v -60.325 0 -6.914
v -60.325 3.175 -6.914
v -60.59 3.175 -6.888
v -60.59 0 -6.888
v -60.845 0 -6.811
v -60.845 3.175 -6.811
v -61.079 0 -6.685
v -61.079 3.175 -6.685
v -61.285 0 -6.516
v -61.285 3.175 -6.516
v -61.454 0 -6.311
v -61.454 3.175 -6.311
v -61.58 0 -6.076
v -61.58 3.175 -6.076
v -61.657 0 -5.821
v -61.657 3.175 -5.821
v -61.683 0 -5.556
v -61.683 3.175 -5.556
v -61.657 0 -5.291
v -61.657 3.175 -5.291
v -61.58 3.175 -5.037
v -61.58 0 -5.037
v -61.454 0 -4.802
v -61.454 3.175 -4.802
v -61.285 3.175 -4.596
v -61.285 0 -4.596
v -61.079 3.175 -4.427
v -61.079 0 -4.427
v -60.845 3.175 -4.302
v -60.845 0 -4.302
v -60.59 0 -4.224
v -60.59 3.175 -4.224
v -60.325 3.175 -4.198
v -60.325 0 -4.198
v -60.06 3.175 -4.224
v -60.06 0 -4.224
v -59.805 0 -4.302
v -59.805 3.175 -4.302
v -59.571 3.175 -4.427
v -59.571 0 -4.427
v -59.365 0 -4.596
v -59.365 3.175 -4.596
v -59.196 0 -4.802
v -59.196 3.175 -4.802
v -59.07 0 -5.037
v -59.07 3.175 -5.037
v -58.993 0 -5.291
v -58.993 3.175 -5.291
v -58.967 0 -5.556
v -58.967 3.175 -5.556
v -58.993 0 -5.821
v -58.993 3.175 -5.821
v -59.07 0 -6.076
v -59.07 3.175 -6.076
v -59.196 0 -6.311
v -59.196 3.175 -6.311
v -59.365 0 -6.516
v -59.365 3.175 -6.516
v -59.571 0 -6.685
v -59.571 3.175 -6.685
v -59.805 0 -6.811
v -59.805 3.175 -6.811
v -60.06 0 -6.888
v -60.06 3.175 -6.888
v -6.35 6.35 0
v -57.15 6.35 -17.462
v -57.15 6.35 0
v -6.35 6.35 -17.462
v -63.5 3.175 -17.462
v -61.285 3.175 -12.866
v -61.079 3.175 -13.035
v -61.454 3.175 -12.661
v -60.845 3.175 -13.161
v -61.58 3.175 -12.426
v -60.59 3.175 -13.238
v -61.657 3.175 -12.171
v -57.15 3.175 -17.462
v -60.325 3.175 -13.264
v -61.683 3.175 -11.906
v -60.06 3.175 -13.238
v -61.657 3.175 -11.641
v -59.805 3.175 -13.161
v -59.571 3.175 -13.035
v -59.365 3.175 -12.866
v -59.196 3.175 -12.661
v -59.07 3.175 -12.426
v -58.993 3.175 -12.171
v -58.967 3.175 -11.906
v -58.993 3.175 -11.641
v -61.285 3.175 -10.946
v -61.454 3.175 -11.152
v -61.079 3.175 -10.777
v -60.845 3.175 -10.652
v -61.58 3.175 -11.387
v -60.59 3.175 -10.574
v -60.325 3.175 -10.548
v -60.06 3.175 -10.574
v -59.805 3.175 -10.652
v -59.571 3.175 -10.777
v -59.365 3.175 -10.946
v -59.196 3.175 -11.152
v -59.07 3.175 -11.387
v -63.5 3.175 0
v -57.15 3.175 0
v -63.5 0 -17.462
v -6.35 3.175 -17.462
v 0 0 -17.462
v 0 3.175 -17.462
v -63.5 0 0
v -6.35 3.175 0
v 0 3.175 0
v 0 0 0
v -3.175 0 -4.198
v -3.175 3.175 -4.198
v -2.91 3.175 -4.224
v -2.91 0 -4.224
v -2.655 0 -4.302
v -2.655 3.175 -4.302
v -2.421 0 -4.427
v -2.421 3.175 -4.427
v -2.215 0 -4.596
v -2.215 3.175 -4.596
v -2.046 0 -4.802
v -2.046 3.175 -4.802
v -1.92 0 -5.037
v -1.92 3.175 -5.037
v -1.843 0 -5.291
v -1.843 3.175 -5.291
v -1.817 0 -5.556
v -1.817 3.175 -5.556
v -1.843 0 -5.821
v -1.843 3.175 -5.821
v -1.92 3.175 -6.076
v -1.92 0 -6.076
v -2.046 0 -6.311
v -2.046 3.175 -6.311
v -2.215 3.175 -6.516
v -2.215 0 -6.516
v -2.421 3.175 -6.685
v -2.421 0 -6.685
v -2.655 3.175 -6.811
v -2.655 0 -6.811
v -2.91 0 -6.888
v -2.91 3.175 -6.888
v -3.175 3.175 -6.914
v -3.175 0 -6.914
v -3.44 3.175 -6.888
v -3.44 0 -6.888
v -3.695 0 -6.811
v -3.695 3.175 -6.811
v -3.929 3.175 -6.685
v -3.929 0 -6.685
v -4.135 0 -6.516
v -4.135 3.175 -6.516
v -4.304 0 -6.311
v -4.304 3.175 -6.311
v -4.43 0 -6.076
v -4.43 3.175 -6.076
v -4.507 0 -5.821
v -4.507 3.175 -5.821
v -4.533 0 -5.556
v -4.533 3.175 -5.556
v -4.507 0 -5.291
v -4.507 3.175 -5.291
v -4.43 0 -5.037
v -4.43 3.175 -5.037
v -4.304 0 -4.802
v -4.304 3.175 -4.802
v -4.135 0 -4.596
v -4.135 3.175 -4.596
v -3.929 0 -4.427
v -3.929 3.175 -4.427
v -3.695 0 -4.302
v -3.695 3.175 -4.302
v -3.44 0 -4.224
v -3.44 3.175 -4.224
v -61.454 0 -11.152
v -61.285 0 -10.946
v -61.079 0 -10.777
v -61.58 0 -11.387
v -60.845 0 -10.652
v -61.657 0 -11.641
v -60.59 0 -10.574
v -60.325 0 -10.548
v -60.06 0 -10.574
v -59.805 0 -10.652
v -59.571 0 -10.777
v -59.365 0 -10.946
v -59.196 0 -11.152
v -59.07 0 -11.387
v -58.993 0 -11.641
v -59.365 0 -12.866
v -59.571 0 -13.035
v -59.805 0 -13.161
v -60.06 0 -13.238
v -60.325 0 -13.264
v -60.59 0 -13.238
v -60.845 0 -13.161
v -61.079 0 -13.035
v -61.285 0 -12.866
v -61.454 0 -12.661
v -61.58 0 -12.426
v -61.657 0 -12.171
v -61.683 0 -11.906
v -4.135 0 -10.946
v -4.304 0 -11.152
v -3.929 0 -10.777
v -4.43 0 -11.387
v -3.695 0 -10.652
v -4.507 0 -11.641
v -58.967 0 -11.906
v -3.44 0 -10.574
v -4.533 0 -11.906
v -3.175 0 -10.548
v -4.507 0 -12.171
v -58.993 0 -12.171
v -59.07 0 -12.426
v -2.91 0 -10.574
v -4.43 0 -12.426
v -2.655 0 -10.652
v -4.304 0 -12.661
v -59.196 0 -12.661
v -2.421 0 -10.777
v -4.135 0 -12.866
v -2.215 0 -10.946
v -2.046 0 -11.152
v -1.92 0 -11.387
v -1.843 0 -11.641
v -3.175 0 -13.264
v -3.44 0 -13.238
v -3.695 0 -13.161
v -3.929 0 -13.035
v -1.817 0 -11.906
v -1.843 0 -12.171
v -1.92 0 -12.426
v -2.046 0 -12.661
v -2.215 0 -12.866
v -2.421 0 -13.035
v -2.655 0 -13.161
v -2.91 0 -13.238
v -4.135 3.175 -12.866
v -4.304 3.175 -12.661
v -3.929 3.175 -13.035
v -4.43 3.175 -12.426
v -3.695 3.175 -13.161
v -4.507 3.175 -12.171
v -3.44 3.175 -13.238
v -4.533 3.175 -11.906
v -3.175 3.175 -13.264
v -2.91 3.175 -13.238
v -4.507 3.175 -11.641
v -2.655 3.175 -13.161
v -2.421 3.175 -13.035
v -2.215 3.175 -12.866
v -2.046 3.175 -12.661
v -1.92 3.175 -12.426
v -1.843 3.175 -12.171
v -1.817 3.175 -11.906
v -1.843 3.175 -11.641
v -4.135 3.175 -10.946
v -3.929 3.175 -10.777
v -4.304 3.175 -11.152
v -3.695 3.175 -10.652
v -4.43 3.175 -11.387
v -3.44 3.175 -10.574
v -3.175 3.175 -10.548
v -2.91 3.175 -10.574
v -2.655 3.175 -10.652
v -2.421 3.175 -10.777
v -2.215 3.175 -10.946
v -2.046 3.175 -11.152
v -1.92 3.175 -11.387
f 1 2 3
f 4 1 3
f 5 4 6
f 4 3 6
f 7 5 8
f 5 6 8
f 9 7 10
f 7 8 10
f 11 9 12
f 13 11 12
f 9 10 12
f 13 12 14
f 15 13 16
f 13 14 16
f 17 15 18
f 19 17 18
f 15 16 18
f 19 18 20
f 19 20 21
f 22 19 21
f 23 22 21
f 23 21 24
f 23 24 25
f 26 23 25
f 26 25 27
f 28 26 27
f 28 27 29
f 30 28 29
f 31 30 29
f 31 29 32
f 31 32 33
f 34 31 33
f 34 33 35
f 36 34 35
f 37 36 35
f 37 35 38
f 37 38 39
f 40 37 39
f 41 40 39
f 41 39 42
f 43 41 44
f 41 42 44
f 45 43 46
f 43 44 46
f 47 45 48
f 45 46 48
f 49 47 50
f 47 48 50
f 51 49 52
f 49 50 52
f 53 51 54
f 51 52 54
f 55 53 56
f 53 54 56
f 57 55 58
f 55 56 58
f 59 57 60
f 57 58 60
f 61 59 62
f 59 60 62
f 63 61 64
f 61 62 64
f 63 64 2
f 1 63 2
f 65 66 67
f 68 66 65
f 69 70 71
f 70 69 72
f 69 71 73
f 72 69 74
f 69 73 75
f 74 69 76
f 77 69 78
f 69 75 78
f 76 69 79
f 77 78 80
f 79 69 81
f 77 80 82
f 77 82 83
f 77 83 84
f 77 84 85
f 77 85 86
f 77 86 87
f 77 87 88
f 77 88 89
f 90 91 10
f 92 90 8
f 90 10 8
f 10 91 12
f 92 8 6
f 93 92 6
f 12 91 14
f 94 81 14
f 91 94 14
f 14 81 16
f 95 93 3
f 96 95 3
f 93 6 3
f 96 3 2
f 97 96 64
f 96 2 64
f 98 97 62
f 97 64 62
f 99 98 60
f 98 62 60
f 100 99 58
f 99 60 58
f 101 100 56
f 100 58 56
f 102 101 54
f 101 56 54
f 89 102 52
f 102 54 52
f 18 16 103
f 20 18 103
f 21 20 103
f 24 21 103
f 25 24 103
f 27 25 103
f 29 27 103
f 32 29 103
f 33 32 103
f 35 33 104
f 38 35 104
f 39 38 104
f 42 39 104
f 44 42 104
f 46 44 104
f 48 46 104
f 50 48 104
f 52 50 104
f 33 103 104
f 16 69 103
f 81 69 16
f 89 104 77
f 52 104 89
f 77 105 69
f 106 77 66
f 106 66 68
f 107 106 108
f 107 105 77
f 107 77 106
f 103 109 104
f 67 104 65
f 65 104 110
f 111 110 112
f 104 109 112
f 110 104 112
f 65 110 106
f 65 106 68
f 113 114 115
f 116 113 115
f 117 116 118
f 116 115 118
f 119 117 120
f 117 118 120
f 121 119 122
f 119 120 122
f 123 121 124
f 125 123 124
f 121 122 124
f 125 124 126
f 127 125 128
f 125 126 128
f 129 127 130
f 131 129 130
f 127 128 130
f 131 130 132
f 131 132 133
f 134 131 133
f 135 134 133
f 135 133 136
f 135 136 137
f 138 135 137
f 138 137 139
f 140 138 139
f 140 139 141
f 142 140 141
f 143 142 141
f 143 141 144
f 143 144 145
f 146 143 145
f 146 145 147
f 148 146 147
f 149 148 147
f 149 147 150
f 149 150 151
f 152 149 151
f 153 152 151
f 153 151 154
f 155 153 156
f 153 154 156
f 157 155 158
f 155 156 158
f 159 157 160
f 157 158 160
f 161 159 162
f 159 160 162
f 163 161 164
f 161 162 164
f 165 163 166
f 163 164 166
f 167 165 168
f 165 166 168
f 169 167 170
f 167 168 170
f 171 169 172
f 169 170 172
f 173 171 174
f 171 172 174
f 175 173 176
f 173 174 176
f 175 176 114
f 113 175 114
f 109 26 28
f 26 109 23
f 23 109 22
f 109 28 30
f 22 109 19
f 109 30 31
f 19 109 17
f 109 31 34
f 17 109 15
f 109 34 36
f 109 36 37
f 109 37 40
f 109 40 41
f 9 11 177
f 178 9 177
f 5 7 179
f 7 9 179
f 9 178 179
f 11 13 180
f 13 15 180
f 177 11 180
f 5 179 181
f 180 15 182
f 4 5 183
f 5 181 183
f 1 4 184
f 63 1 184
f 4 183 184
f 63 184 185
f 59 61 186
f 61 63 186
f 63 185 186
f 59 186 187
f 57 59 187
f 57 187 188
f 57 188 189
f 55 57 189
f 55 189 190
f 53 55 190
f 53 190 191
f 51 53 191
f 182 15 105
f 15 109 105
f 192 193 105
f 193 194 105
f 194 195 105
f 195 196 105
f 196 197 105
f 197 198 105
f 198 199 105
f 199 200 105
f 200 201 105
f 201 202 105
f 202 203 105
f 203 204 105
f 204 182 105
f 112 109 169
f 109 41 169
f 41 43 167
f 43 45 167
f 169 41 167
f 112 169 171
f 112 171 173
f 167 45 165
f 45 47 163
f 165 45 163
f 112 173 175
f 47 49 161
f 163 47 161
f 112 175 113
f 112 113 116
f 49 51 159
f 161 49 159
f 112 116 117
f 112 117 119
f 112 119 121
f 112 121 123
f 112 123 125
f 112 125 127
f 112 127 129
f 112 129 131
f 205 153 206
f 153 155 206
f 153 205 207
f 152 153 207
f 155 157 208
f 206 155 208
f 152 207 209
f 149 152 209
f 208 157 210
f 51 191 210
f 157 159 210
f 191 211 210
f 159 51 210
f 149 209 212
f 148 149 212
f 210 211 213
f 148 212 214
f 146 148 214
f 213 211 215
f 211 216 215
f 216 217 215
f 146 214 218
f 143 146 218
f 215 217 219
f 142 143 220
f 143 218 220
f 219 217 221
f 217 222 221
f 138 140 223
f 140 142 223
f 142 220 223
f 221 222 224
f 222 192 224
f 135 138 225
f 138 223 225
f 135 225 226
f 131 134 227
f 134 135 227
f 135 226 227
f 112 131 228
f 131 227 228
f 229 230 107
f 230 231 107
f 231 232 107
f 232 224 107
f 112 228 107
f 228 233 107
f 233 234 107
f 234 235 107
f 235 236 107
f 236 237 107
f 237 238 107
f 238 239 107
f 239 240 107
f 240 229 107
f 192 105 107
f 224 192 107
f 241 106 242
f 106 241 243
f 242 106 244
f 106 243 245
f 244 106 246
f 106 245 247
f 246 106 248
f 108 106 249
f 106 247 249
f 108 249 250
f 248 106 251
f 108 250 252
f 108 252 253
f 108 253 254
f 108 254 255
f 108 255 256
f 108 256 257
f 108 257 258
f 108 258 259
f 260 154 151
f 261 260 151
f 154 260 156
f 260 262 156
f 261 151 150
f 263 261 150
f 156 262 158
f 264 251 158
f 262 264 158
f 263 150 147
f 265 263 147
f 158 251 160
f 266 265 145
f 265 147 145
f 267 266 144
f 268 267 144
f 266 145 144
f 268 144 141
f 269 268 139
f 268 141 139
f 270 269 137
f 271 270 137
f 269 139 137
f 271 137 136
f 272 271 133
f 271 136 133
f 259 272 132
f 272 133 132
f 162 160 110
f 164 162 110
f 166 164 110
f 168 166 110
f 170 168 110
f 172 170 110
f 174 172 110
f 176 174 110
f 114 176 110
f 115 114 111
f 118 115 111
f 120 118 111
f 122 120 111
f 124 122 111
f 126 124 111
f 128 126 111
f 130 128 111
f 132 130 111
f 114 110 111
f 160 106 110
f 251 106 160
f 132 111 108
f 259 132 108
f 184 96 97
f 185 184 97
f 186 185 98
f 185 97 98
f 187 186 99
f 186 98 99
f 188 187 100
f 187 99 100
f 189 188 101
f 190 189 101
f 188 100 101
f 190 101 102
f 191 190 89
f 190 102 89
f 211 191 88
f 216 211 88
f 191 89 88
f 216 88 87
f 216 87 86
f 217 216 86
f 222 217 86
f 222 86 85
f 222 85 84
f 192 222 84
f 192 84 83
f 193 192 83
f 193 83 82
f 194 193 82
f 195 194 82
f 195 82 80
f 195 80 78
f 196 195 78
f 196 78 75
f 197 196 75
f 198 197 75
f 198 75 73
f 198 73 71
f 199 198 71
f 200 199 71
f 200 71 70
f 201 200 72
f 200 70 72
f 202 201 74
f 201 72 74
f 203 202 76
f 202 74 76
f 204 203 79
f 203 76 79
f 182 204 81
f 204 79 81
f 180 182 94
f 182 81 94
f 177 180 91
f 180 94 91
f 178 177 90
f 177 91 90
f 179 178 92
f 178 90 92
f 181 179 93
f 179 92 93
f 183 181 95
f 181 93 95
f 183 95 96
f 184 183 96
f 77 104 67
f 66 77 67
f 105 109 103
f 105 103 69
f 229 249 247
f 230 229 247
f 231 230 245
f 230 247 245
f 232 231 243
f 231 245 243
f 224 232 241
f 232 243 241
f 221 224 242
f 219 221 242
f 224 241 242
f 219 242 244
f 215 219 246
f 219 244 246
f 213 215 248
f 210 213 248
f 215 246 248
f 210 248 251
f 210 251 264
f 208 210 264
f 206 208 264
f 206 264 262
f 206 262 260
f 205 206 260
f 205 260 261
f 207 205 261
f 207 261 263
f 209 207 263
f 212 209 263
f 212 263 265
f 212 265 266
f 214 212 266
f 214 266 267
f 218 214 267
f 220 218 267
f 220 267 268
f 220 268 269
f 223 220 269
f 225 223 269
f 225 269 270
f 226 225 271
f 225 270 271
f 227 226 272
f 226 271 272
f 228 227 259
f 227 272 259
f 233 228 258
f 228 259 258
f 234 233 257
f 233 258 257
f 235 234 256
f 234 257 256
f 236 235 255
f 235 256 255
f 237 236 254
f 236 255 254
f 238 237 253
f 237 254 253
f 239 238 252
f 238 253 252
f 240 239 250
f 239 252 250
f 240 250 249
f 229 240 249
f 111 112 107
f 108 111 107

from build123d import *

# Parameters (mm, degrees)
SKETCH1_W           = 63.5
SKETCH1_H           = 17.4625
BOSS_EXTRUDE1_DEPTH = 6.35
SKETCH2_W           = 6.35
SKETCH2_H           = 3.175
CUT_EXTRUDE1_DEPTH  = 67.1627645
SKETCH3_R           = 1.357929869
CUT_EXTRUDE2_DEPTH  = 67.1627645


with BuildPart() as part:
    # Sketch1 → Boss-Extrude1 (new body)
    with BuildSketch(Plane(origin=(0, 0, 0), x_dir=(1, 0, 0), z_dir=(0, 1, 0))):
        with Locations((-31.75, 8.73125)):
            Rectangle(SKETCH1_W, SKETCH1_H)
    extrude(amount=BOSS_EXTRUDE1_DEPTH)

    # Sketch2 → Cut-Extrude1 (cut, through all)
    with BuildSketch(Plane.XY):
        with Locations((-3.175, 4.7625)):
            Rectangle(SKETCH2_W, SKETCH2_H)
        with Locations((-60.325, 4.7625)):
            Rectangle(SKETCH2_W, SKETCH2_H)
    extrude(amount=-CUT_EXTRUDE1_DEPTH, mode=Mode.SUBTRACT)

    # Sketch3 → Cut-Extrude2 (cut, through all)
    with BuildSketch(Plane(origin=(0, 6.35, 0), x_dir=(1, 0, 0), z_dir=(0, 1, 0))):
        with Locations(Location((-60.325, 11.90625, 0), (0, 0, 270))):
            Circle(SKETCH3_R)
        with Locations(Location((-60.325, 5.55625, 0), (0, 0, 90))):
            Circle(SKETCH3_R)
        with Locations(Location((-3.175, 5.55625, 0), (0, 0, 270))):
            Circle(SKETCH3_R)
        with Locations(Location((-3.175, 11.90625, 0), (0, 0, 90))):
            Circle(SKETCH3_R)
    extrude(amount=-CUT_EXTRUDE2_DEPTH, mode=Mode.SUBTRACT)


solid = part.part
